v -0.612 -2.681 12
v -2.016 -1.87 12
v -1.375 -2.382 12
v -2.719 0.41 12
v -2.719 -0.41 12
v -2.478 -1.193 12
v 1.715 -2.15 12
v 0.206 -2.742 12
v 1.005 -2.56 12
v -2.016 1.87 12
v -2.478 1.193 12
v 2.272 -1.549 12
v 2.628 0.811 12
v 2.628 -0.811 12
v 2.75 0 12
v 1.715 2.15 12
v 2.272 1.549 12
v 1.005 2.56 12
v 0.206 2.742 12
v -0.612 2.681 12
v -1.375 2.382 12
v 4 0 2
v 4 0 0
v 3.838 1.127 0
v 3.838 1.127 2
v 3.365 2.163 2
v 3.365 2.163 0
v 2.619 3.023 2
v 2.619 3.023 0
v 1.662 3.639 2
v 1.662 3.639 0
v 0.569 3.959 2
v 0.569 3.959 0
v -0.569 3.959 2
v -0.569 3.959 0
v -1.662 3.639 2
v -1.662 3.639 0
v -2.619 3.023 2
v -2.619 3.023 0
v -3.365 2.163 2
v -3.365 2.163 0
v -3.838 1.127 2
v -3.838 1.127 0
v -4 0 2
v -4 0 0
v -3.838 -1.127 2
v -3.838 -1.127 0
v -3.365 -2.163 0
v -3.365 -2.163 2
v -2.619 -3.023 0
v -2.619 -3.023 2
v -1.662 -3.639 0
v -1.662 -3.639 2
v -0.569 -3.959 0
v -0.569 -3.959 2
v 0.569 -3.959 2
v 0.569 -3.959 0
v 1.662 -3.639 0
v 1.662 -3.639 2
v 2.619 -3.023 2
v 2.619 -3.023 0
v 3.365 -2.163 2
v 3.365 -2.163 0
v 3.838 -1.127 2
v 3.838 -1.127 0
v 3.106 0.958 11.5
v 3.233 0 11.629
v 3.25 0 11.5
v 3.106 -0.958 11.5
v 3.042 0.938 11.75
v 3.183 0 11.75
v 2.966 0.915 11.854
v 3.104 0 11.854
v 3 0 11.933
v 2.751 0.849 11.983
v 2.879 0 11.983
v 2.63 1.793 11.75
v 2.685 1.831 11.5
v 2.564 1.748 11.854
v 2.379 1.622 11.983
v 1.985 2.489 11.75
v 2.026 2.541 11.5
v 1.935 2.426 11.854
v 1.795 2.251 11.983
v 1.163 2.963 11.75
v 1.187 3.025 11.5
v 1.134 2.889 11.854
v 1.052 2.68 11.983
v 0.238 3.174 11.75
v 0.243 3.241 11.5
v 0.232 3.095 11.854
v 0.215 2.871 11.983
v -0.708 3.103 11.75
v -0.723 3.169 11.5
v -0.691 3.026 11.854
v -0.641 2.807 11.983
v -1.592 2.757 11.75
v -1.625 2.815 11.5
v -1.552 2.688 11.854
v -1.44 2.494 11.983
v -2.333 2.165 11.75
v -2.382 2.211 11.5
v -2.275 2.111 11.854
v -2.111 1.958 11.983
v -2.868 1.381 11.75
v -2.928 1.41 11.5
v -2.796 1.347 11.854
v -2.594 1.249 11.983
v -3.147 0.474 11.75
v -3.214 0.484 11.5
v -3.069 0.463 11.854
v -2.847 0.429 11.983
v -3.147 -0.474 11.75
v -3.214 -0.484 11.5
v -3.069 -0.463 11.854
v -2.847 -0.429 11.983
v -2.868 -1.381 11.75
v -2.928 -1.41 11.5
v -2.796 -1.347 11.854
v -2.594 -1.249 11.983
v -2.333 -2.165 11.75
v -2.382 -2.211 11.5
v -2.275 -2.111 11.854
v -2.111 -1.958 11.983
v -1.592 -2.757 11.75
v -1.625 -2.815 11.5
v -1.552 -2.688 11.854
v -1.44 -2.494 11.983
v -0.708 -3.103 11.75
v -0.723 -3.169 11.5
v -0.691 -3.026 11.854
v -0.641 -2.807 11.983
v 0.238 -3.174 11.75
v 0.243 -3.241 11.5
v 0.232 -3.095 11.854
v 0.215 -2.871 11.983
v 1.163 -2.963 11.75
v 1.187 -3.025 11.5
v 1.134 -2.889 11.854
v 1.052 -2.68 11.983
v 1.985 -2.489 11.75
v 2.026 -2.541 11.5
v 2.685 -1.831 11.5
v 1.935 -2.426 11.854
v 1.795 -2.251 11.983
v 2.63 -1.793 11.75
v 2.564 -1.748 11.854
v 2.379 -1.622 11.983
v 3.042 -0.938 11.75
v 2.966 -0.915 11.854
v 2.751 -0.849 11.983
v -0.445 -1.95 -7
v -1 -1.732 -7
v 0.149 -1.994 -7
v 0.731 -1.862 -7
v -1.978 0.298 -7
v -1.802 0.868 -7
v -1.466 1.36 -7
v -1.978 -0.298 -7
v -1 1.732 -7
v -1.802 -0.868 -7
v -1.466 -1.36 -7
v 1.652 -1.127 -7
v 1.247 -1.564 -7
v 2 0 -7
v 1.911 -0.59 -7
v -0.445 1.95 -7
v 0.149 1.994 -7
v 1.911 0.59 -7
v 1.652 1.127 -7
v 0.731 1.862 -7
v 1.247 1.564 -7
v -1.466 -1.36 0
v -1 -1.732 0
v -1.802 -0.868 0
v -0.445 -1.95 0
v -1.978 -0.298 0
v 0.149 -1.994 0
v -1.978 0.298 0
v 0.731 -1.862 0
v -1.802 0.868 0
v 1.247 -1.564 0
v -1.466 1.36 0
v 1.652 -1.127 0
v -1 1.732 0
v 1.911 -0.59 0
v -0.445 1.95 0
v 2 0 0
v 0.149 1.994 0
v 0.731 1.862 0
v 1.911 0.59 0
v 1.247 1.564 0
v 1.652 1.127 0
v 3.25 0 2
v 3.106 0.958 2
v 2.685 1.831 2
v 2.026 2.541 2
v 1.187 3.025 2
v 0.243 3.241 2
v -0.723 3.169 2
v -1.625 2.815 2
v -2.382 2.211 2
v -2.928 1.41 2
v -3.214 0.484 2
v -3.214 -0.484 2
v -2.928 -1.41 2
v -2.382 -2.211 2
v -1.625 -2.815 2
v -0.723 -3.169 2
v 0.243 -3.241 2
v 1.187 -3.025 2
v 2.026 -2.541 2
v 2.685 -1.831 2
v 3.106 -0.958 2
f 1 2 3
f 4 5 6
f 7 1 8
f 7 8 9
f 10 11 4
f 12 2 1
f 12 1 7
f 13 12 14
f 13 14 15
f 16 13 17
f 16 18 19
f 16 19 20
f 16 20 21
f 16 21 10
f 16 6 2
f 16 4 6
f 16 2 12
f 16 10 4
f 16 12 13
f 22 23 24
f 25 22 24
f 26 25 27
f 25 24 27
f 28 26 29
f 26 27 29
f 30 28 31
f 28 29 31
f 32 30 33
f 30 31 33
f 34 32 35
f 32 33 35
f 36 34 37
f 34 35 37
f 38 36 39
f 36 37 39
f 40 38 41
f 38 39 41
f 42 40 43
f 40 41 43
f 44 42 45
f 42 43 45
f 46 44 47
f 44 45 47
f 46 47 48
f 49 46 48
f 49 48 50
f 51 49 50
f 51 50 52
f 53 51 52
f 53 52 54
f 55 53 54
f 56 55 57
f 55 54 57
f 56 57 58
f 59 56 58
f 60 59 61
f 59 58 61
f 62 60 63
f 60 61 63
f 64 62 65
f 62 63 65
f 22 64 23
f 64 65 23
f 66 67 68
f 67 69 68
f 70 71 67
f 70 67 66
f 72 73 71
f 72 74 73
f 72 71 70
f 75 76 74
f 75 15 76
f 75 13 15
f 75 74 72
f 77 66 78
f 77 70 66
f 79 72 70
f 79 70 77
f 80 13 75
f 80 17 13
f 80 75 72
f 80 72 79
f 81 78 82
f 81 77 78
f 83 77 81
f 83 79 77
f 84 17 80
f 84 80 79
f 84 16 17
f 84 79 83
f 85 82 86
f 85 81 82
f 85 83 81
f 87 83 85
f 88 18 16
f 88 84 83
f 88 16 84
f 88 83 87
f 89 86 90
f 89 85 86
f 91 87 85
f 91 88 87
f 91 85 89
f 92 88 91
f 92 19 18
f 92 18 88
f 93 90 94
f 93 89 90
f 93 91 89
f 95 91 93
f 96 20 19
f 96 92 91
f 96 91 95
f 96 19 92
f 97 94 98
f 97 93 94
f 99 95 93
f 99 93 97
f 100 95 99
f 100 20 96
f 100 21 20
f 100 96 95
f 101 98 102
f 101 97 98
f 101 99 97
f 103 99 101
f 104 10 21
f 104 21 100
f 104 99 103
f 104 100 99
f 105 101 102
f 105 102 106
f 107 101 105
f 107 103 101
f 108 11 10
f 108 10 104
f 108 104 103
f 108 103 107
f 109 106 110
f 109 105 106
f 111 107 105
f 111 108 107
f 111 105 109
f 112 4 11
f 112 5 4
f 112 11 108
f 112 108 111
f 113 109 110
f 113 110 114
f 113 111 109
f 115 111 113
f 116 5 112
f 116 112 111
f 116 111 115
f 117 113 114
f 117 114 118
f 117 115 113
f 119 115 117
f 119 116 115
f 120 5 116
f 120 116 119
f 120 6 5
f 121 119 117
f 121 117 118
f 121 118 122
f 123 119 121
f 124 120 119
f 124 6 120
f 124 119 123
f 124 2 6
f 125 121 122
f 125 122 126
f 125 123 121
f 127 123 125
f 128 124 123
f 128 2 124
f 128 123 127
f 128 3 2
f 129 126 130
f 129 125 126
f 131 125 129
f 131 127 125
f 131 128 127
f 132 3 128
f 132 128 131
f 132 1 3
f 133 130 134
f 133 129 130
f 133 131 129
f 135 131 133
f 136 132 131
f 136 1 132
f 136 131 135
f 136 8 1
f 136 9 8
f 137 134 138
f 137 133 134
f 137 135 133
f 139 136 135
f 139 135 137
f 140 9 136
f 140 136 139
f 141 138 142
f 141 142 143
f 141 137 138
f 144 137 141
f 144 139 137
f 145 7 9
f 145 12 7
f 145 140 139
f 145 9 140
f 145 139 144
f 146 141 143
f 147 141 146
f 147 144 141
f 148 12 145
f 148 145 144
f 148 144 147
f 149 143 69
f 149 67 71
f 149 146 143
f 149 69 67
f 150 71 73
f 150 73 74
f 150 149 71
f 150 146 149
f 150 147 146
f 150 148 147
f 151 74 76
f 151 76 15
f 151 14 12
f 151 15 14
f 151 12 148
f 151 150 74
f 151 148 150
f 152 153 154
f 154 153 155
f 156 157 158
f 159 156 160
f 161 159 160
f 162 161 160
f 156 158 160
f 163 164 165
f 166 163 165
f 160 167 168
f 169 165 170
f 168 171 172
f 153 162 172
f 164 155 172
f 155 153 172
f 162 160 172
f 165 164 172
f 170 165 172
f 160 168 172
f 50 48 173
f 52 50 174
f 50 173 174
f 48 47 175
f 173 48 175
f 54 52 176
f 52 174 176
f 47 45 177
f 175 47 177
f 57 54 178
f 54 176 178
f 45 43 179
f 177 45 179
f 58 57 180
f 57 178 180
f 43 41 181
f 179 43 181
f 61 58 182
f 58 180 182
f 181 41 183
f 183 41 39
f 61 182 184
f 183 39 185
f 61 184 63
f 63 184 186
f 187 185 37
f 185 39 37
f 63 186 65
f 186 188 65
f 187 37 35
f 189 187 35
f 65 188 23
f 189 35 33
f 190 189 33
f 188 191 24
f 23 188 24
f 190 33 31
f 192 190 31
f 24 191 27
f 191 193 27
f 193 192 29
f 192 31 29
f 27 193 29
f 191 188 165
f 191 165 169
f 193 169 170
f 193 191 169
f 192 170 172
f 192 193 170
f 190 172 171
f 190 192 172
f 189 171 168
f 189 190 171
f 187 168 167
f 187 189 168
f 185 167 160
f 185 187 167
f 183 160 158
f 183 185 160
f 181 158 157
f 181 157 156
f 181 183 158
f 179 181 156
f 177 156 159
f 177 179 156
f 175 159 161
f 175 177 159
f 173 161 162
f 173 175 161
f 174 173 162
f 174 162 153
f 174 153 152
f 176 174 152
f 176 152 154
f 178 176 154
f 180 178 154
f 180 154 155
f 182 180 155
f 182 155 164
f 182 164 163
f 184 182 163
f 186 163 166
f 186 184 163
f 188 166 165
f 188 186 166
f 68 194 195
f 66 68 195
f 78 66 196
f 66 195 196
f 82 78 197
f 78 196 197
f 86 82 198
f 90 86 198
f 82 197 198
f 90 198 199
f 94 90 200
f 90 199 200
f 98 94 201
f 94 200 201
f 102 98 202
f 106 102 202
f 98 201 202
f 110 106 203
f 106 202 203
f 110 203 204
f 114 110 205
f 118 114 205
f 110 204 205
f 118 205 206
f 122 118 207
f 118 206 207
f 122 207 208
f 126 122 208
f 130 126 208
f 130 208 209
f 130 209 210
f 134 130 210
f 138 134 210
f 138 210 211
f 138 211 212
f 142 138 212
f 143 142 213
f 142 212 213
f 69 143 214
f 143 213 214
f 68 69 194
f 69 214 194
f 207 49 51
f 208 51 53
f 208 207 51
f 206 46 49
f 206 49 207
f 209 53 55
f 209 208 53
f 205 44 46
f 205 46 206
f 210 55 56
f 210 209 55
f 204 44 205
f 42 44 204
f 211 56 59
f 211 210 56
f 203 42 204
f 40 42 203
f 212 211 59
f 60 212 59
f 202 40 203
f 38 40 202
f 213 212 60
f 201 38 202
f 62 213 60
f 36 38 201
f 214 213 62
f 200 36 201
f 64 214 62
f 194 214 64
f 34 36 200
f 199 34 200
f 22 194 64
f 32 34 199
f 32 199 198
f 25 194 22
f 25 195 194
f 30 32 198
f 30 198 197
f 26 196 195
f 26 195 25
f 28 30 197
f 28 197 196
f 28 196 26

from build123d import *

# Parameters (mm, degrees)
F0_R     = 4
F0_R_2   = 2
F1_DEPTH = 2
F2_R     = 3.25
F3_DEPTH = 10
F4_DEPTH = 7
F5_R     = 0.5


with BuildPart() as f1:
    # F0 (on Top) → F1 (new body)
    with BuildSketch(Plane.XY):
        Circle(F0_R)
        Circle(F0_R_2, mode=Mode.SUBTRACT)
        Circle(F0_R_2)
    extrude(amount=F1_DEPTH)

    # F2 (on face) → F3 (join)
    with BuildSketch(Plane.XY.offset(2)):
        Circle(F2_R)
    extrude(amount=F3_DEPTH)

    # F0 (on Top) → F4 (join)
    with BuildSketch(Plane.XY):
        Circle(F0_R_2)
    extrude(amount=-F4_DEPTH)

    # F5
    f5_edges = [f1.edges().sort_by_distance(p)[0] for p in [
        (-3.25, 0, 12),
    ]]
    fillet(f5_edges, radius=F5_R)


solid = f1.part
